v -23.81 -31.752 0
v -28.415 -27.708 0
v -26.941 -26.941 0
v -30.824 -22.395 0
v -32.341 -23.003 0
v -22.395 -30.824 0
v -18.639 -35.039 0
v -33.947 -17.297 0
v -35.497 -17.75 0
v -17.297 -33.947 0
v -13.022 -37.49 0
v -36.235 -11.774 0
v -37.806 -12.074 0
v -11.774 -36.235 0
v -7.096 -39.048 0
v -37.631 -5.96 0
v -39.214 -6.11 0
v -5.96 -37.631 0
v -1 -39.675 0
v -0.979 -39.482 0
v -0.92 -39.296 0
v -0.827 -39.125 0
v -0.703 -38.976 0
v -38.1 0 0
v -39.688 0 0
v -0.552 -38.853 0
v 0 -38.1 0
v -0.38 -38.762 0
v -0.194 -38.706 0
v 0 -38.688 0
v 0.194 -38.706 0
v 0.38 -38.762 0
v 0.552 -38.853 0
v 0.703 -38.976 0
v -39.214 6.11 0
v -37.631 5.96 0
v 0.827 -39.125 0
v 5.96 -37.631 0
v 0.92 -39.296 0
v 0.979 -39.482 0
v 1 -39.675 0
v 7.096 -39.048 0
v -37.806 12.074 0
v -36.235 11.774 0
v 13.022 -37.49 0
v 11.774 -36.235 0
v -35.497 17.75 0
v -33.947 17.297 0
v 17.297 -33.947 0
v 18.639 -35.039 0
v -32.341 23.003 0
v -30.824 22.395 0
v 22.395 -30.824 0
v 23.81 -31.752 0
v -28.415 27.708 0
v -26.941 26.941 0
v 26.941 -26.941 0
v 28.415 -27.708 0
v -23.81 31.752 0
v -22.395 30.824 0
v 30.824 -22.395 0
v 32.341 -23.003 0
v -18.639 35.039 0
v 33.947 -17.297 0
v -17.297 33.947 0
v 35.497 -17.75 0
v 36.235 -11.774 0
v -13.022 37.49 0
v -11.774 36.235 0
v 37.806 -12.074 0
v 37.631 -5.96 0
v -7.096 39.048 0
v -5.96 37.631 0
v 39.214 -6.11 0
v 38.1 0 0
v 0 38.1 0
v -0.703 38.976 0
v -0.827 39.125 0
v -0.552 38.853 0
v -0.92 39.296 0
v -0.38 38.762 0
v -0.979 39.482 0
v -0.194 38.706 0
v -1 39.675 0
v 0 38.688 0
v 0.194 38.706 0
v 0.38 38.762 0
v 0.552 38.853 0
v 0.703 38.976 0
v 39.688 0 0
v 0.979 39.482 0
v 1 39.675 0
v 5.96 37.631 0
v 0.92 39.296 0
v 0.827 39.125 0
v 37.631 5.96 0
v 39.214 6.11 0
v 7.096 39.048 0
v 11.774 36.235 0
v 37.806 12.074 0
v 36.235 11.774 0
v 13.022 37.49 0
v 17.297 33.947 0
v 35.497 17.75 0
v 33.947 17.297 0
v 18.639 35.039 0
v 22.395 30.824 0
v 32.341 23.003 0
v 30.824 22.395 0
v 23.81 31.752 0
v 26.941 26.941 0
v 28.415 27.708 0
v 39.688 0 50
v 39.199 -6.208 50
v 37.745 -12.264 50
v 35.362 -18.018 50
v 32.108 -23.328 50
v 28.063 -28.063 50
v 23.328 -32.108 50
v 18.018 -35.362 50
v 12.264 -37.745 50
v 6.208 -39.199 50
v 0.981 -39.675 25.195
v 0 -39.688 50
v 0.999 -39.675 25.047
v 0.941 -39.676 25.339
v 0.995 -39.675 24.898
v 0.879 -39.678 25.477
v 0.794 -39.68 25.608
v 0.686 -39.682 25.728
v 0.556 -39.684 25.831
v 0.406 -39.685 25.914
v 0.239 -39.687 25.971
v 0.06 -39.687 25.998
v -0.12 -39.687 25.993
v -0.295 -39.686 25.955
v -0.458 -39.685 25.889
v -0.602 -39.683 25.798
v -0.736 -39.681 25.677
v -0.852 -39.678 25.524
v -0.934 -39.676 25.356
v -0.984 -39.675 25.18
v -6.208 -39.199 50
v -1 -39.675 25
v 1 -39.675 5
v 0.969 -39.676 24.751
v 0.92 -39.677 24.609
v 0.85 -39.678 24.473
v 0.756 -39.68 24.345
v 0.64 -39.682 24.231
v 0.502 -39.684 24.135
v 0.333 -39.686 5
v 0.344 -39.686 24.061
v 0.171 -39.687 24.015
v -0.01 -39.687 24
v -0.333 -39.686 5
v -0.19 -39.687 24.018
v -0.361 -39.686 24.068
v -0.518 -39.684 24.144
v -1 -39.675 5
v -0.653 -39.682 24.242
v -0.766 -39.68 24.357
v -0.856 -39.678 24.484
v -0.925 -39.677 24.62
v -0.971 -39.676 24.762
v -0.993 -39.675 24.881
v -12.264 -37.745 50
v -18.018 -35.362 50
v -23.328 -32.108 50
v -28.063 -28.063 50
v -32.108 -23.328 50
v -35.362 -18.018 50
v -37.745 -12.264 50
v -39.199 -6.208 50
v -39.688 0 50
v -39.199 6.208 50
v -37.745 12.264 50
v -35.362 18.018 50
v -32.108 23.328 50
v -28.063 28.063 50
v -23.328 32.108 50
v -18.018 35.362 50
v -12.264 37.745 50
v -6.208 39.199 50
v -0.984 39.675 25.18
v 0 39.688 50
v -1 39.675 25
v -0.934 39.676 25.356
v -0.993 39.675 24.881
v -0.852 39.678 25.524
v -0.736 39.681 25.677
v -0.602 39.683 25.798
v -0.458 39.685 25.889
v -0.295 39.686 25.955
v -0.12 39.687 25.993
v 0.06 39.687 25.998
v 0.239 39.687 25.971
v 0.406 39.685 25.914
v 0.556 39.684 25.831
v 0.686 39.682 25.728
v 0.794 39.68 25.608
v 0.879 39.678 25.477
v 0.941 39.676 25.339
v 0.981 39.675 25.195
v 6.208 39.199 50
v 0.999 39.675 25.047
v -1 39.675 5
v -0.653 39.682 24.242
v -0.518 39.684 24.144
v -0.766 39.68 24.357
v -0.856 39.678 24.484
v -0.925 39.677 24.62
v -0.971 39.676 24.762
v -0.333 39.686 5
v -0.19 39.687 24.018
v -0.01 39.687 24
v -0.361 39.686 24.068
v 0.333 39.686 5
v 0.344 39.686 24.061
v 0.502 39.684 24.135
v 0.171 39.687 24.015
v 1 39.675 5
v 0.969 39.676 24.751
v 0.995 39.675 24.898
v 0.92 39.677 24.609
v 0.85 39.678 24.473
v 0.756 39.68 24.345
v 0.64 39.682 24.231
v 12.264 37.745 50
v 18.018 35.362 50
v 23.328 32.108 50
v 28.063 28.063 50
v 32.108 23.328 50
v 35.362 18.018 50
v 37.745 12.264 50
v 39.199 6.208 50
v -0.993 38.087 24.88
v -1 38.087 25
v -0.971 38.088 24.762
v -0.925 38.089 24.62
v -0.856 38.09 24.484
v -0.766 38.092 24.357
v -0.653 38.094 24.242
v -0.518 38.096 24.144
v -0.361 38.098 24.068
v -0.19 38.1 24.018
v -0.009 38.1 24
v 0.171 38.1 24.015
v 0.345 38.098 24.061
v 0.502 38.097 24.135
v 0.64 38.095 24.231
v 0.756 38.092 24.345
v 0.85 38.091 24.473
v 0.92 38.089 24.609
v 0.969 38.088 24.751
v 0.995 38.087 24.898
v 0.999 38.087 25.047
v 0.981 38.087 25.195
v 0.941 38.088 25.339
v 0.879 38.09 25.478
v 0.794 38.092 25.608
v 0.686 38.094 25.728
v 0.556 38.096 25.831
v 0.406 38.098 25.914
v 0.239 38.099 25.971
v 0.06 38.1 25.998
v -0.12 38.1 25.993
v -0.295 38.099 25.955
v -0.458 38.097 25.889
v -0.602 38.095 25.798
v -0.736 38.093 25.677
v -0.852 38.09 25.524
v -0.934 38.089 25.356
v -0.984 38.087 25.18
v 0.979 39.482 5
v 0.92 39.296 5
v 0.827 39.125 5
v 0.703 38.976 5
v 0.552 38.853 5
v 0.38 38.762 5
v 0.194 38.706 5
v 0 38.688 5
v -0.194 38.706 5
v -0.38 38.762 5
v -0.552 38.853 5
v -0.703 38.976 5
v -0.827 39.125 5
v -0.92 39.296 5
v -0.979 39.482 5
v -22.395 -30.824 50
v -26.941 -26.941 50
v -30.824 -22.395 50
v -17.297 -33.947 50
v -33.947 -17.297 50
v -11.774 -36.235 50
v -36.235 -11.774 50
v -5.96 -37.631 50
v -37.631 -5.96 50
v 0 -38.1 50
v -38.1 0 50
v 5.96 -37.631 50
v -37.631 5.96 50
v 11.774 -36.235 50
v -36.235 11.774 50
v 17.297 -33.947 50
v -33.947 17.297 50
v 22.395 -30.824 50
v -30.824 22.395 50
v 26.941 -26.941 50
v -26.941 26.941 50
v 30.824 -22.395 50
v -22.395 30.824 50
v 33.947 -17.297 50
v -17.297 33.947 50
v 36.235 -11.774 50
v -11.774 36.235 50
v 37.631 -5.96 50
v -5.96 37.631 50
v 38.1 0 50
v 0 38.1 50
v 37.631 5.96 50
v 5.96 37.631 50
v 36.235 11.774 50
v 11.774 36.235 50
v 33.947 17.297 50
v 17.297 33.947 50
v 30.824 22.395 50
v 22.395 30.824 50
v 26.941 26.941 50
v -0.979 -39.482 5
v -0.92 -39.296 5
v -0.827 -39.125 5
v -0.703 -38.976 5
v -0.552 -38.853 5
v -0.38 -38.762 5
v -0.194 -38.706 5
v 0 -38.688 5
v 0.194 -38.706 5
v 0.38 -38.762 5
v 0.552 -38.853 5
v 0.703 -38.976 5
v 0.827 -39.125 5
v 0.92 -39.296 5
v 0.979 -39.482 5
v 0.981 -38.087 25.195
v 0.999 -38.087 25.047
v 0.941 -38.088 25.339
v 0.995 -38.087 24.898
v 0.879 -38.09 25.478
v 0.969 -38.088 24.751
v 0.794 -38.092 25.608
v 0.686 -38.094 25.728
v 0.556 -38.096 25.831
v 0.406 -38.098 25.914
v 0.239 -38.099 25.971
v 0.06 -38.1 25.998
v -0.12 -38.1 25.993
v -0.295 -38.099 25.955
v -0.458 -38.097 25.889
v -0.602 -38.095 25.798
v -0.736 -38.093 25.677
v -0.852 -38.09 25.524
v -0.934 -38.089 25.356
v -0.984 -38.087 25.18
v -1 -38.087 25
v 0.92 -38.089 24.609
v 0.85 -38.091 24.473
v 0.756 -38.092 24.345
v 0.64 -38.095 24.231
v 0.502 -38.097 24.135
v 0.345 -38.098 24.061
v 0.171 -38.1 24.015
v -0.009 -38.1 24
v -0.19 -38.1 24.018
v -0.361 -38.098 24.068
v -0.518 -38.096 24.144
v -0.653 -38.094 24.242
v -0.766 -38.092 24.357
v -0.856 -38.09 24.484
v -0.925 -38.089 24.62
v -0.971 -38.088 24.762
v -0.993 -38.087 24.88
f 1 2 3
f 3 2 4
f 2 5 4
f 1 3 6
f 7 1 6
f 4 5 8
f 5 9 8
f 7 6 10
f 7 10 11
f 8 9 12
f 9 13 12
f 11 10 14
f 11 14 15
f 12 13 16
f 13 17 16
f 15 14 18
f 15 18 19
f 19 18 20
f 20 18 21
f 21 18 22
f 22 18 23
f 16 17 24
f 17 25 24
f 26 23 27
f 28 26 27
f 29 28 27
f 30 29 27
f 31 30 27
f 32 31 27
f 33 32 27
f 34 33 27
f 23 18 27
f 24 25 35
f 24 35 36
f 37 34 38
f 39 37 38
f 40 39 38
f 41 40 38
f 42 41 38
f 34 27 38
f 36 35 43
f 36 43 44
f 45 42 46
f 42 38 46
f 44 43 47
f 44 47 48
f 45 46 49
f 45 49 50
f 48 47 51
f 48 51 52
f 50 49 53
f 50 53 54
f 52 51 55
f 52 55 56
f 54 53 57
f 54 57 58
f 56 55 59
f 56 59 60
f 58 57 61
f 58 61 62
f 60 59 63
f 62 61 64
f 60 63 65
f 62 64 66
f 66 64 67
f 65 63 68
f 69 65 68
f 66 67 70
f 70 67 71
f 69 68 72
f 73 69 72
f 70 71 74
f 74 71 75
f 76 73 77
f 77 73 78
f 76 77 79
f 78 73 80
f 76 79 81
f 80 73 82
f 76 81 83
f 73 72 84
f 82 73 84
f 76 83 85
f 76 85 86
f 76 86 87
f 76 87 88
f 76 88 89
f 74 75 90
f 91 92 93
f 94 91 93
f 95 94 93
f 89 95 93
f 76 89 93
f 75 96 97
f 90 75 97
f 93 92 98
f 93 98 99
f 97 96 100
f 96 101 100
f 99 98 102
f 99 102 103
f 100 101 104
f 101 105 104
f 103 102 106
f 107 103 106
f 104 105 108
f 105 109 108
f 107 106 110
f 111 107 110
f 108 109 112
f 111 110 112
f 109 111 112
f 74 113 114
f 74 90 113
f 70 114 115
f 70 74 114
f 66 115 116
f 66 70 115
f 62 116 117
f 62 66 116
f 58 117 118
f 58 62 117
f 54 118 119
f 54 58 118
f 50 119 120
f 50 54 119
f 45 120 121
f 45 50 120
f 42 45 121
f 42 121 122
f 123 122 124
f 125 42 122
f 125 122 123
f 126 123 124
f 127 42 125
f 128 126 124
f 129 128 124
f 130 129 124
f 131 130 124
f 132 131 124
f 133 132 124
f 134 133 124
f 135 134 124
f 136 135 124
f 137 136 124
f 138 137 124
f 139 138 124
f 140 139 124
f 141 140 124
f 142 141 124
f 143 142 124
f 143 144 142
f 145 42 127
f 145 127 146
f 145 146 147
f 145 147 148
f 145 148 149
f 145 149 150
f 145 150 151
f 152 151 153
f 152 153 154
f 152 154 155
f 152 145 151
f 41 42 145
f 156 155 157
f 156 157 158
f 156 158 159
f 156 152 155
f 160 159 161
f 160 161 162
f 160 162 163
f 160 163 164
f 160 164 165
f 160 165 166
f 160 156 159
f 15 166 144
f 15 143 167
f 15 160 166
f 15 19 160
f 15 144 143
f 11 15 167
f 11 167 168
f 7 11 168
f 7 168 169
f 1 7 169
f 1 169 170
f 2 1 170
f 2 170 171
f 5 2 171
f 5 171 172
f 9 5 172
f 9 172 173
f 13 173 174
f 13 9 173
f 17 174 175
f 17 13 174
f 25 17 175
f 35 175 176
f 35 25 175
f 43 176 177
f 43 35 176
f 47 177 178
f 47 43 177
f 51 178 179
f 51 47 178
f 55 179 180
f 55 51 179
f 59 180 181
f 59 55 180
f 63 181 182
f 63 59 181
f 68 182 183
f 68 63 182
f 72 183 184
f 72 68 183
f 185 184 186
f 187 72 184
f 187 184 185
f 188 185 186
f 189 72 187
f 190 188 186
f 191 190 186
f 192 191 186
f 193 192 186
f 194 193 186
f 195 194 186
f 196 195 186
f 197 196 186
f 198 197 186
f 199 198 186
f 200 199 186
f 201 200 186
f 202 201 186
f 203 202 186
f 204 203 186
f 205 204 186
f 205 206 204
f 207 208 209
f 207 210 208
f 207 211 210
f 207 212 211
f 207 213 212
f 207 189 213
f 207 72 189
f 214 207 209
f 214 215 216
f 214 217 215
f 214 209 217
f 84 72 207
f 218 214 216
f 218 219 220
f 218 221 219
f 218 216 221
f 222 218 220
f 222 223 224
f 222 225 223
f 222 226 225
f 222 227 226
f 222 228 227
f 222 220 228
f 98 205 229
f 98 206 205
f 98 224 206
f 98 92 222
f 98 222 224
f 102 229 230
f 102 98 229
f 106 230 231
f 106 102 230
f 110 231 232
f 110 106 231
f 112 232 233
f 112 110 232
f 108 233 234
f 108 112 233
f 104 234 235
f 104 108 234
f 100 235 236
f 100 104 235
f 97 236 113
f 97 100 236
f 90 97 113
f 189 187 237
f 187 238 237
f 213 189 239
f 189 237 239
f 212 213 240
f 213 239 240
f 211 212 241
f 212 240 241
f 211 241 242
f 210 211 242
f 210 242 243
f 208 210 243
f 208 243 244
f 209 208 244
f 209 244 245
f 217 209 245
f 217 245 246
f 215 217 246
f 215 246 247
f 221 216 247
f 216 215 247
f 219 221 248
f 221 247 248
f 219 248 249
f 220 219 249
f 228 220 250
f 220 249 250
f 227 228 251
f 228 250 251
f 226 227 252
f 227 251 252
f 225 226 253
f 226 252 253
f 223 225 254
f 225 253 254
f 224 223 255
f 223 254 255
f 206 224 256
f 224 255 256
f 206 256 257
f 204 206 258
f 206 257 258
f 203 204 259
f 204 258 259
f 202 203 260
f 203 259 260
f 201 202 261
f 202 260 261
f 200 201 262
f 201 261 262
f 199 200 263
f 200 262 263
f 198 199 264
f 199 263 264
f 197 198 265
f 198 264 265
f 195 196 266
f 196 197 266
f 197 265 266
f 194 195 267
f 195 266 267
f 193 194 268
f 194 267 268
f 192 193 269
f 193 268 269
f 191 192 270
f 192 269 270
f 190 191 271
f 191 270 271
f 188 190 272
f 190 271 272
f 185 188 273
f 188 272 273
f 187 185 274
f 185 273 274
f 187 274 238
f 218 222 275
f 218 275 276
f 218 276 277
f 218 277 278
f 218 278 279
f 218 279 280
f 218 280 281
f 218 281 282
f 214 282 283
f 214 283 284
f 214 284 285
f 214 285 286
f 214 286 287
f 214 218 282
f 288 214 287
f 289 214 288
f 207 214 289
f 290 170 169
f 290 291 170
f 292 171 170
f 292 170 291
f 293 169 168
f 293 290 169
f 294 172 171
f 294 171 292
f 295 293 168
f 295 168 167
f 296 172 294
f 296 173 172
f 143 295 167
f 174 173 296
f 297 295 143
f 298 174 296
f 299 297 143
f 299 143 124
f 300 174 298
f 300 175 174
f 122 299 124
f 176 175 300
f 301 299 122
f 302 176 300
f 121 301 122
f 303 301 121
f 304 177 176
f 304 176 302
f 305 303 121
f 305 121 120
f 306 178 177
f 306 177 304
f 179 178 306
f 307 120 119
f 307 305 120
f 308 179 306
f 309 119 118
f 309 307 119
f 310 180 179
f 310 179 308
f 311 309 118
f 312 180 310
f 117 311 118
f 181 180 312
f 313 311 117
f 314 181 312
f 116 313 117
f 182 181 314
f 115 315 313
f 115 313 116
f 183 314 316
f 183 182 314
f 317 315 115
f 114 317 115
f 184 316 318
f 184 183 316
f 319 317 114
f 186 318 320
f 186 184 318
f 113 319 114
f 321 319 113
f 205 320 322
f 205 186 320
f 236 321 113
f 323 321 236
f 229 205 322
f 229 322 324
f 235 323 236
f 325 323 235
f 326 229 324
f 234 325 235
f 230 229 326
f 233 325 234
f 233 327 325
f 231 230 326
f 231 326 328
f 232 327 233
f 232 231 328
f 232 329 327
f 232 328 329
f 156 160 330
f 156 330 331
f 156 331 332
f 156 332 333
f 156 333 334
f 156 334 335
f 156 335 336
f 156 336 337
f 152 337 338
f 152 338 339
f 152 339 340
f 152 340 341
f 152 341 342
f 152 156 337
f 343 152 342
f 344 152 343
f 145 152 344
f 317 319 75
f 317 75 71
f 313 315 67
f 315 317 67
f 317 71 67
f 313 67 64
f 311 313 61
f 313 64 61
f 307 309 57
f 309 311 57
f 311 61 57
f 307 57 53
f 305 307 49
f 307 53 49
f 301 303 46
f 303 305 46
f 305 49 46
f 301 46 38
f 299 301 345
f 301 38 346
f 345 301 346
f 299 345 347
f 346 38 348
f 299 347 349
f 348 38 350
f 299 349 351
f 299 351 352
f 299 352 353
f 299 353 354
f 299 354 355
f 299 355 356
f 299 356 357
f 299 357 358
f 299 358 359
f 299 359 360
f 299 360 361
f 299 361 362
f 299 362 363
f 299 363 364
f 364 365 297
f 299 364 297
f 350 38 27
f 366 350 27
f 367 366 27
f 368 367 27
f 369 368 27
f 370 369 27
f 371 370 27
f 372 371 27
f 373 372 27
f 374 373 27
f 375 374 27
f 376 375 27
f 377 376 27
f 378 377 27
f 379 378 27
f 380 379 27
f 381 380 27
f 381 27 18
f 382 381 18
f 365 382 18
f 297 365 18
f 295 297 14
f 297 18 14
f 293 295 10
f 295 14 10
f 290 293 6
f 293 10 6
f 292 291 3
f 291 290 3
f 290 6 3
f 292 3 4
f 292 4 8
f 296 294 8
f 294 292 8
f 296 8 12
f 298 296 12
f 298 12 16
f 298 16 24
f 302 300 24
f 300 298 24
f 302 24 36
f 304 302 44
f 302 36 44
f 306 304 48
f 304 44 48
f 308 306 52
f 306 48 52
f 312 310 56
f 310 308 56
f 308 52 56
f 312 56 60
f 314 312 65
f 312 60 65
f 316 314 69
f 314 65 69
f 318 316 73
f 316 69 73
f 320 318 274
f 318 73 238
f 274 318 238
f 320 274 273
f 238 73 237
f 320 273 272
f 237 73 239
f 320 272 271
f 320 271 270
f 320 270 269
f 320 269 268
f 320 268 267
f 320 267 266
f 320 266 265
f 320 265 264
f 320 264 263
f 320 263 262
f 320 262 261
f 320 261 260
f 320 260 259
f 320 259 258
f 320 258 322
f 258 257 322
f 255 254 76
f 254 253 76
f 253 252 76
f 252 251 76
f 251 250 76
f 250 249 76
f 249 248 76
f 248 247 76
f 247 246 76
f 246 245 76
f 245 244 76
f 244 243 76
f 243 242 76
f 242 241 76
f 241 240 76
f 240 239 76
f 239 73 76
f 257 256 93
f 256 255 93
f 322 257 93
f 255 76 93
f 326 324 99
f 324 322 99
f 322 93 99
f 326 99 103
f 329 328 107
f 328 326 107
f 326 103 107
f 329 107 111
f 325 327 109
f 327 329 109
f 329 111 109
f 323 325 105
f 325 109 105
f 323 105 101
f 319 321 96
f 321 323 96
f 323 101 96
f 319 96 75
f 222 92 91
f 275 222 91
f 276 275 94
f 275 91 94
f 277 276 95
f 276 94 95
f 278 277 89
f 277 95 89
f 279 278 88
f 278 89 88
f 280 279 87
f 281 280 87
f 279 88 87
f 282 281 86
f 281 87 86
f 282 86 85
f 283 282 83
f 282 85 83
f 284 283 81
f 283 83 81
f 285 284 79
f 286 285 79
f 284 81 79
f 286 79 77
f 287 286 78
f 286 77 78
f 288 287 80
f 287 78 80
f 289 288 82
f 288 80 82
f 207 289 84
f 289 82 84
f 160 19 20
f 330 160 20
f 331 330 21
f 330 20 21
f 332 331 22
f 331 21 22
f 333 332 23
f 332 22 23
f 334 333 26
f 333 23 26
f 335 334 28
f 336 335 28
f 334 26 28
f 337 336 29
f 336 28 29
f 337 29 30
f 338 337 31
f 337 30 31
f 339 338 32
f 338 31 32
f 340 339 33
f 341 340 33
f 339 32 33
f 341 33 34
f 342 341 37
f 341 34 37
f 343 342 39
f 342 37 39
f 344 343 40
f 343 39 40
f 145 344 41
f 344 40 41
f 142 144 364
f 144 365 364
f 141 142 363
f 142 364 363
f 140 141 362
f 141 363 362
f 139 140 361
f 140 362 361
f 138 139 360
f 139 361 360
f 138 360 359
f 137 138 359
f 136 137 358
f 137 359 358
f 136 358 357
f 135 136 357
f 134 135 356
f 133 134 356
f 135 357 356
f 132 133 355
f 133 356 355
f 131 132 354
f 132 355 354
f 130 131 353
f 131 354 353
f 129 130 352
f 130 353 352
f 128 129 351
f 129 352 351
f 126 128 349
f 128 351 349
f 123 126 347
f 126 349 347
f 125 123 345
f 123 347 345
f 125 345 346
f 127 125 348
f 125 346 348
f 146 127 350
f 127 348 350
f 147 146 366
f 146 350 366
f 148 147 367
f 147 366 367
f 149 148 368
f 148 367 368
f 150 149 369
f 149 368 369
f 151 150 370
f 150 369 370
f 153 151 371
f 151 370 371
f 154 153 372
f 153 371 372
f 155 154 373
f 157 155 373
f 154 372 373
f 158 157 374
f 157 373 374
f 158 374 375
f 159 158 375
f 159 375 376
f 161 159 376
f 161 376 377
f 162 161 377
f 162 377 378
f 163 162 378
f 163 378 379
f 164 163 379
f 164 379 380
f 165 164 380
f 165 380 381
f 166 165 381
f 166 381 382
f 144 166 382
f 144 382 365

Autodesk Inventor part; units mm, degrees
ref_plane "YZ Plane" through (0, 0, 0) normal (1, 0, 0) x (0, 1, 0)
ref_plane "XZ Plane" through (0, 0, 0) normal (0, 1, 0) x (-1, 0, 0)
ref_plane "XY Plane" through (0, 0, 0) normal (0, 0, 1) x (1, 0, 0)
sketch "Sketch1" plane through (0, 0, 0) normal (0, 0, 1) x (1, 0, 0)
  circle A0 centre (0, 0) radius 38.1
  circle A1 centre (0, 0) radius 39.6875
  dimension "d0" = 76.2
  dimension "d1" = 79.375
extrude "Extrusion1" add sketch "Sketch1" along normal blind 50
sketch "Sketch2" plane through (0, 0, 0) normal (1, 0, 0) x (0, 1, 0)
  circle A0 centre (0, 30) radius 1
  line L0 (-39.6875, 0) -> (39.6875, 0) projected
  point P0 (0, 0)
  dimension "d4" = 2
  dimension "d5" = 30
extrude "Extrusion2" [suppressed]
sketch "Sketch3" plane through (0, 0, 0) normal (0, 1, 0) x (-1, 0, 0)
  circle A0 centre (0, 25) radius 1
  line L0 (-39.6875, 0) -> (39.6875, 0) projected
  line L1 (39.6875, 50) -> (-39.6875, 50) projected
  point P0 (0, 0)
  dimension "d8" = 2
  dimension "d12" = 25
extrude "Extrusion3" cut sketch "Sketch3" along normal through all both and the other way through all
sketch "Sketch5" plane through (0, 0, 0) normal (0, 0, -1) x (-1, 0, 0)
  circle A0 centre (0, 39.6875) radius 1
  point P0 (0, 0)
  dimension "d20" = 2
  dimension "d21" = 39.6875
extrude "Extrusion5" cut sketch "Sketch5" against normal blind 5
pattern_circular "Circular Pattern2" count 2 over 360 about axis through (0, 0, 0) along (0, 0, 1) of "Extrusion5"
properties part number "pipe_70mm"
